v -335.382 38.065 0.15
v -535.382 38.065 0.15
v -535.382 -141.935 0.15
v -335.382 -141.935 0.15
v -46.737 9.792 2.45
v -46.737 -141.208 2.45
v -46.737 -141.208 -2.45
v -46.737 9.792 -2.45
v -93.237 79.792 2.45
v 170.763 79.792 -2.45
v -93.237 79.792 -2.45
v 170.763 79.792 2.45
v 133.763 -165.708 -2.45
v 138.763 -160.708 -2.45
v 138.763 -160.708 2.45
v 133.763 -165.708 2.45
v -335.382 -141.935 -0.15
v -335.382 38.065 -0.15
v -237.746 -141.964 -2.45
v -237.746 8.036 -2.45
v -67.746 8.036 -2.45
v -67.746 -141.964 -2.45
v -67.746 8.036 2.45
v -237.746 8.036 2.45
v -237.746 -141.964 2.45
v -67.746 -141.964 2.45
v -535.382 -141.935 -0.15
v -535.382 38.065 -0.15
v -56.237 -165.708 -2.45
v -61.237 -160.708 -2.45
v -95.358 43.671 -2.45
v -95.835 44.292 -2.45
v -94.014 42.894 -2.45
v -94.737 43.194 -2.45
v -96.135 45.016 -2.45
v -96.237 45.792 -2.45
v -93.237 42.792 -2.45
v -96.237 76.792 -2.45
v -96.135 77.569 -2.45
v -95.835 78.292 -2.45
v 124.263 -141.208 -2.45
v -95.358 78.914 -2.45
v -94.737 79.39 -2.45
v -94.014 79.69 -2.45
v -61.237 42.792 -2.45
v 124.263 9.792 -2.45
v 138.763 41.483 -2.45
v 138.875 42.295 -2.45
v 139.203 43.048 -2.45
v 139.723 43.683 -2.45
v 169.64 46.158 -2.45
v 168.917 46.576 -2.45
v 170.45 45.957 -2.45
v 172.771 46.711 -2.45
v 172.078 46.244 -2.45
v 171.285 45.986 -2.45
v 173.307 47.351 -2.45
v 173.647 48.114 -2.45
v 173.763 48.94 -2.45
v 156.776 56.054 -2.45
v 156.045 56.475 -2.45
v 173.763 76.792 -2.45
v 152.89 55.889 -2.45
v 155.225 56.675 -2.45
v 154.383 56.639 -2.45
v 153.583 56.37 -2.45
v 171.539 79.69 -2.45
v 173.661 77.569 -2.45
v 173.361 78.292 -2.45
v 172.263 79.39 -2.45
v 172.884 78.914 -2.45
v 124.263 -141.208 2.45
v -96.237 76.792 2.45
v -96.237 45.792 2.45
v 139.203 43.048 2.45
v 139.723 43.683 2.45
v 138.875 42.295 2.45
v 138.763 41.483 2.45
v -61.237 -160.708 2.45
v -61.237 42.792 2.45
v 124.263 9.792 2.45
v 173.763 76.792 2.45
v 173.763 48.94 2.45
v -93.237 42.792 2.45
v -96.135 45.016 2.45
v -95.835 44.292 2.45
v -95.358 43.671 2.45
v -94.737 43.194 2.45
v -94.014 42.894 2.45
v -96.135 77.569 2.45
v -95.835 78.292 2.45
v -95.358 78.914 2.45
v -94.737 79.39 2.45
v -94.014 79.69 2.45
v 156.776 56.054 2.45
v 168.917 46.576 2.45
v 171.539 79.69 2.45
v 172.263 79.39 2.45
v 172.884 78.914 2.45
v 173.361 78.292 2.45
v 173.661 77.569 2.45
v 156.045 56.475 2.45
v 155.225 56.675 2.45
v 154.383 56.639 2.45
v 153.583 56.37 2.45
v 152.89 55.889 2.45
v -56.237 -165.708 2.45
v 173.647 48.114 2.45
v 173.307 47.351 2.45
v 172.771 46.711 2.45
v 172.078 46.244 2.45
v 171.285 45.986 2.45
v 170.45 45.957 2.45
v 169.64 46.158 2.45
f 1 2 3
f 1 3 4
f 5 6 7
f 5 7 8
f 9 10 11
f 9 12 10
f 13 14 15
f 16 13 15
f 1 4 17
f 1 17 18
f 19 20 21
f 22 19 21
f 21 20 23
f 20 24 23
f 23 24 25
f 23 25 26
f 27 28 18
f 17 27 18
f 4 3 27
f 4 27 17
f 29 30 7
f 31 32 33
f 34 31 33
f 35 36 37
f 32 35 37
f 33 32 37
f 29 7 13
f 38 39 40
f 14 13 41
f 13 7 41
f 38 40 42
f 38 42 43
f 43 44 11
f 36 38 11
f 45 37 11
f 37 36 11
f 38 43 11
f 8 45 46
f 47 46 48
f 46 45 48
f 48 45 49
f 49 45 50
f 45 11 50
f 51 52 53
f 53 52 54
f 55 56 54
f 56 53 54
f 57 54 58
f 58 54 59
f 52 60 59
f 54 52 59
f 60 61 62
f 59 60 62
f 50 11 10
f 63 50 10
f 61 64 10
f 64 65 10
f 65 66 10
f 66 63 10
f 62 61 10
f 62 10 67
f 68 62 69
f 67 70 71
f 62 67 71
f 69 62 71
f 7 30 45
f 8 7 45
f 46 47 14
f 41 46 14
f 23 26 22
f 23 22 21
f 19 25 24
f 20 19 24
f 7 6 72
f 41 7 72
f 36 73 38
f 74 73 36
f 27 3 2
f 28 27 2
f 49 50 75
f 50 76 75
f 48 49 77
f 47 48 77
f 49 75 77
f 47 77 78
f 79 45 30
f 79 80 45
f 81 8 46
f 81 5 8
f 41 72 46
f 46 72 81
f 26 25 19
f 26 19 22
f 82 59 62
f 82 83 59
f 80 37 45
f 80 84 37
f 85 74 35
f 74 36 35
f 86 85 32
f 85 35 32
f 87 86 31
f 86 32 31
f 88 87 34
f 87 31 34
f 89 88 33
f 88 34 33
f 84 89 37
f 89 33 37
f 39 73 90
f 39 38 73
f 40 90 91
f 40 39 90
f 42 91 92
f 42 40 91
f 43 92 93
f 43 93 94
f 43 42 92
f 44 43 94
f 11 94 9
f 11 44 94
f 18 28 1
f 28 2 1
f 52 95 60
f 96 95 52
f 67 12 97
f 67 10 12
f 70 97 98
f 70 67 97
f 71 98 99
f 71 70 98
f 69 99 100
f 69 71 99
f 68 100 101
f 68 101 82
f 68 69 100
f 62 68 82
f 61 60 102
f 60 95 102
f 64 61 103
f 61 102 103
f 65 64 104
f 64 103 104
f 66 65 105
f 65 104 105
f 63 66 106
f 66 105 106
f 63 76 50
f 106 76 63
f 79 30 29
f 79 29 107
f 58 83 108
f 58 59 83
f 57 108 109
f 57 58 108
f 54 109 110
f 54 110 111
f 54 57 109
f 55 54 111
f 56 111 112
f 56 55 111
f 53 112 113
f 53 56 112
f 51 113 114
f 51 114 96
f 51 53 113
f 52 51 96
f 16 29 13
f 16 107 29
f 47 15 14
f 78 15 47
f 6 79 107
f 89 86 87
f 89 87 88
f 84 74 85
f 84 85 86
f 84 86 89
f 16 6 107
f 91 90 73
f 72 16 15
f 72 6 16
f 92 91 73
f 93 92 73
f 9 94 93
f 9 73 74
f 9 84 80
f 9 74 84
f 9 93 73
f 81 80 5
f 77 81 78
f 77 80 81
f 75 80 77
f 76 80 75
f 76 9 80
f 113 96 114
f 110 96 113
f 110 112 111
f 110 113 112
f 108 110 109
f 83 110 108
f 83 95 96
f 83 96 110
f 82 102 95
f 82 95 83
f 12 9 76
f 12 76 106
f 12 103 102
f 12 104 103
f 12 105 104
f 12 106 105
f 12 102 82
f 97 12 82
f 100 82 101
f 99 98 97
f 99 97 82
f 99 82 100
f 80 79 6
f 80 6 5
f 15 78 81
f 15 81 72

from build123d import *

# Parameters (mm, degrees)
F0_W     = 171
F0_H     = 151
F1_DEPTH = 2.45
F2_R     = 3
F3_R     = 3
F4_SIZE  = 5
F5_W     = 170
F5_H     = 150
F6_DEPTH = 2.45
F7_W     = 200
F7_H     = 180
F8_DEPTH = 0.15


with BuildPart() as f1:
    # F0 (on Top) → F1 (new body, symmetric)
    with BuildSketch(Plane.XY):
        Polygon((-61.237101, 42.792188), (-61.237101, -165.707812), (138.762899, -165.707812), (138.762899, 42.792188), (154.762899, 57.625629), (173.762899, 42.792188), (173.762899, 79.792188), (-96.237101, 79.792188), (-96.237101, 42.792188), align=None)
        with Locations((38.762899, -65.707812)):
            Rectangle(F0_W, F0_H, mode=Mode.SUBTRACT)
    extrude(amount=F1_DEPTH, both=True)

    # F2
    f2_edges = [f1.edges().sort_by_distance(p)[0] for p in [
        (-96.237101, 79.792188, 0),
        (173.762899, 79.792188, 0),
        (173.762899, 42.792188, 0),
        (138.762899, 42.792188, 0),
        (154.762899, 57.625629, 0),
    ]]
    fillet(f2_edges, radius=F2_R)

    # F3
    f3_edges = [f1.edges().sort_by_distance(p)[0] for p in [
        (-96.237101, 42.792188, 0),
    ]]
    fillet(f3_edges, radius=F3_R)

    # F4
    f4_edges = [f1.edges().sort_by_distance(p)[0] for p in [
        (-61.237101, -165.707812, 0),
        (138.762899, -165.707812, 0),
    ]]
    chamfer(f4_edges, length=F4_SIZE)


with BuildPart() as f6:
    # F5 (on Top) → F6 (new body, symmetric)
    with BuildSketch(Plane.XY):
        with Locations((-152.746104, -66.963842)):
            Rectangle(F5_W, F5_H)
    extrude(amount=F6_DEPTH, both=True)


with BuildPart() as f8:
    # F7 (on Top) → F8 (new body, symmetric)
    with BuildSketch(Plane.XY):
        with Locations((-435.381746, -51.934633)):
            Rectangle(F7_W, F7_H)
    extrude(amount=F8_DEPTH, both=True)


solid = Compound([f1.part, f6.part, f8.part])
